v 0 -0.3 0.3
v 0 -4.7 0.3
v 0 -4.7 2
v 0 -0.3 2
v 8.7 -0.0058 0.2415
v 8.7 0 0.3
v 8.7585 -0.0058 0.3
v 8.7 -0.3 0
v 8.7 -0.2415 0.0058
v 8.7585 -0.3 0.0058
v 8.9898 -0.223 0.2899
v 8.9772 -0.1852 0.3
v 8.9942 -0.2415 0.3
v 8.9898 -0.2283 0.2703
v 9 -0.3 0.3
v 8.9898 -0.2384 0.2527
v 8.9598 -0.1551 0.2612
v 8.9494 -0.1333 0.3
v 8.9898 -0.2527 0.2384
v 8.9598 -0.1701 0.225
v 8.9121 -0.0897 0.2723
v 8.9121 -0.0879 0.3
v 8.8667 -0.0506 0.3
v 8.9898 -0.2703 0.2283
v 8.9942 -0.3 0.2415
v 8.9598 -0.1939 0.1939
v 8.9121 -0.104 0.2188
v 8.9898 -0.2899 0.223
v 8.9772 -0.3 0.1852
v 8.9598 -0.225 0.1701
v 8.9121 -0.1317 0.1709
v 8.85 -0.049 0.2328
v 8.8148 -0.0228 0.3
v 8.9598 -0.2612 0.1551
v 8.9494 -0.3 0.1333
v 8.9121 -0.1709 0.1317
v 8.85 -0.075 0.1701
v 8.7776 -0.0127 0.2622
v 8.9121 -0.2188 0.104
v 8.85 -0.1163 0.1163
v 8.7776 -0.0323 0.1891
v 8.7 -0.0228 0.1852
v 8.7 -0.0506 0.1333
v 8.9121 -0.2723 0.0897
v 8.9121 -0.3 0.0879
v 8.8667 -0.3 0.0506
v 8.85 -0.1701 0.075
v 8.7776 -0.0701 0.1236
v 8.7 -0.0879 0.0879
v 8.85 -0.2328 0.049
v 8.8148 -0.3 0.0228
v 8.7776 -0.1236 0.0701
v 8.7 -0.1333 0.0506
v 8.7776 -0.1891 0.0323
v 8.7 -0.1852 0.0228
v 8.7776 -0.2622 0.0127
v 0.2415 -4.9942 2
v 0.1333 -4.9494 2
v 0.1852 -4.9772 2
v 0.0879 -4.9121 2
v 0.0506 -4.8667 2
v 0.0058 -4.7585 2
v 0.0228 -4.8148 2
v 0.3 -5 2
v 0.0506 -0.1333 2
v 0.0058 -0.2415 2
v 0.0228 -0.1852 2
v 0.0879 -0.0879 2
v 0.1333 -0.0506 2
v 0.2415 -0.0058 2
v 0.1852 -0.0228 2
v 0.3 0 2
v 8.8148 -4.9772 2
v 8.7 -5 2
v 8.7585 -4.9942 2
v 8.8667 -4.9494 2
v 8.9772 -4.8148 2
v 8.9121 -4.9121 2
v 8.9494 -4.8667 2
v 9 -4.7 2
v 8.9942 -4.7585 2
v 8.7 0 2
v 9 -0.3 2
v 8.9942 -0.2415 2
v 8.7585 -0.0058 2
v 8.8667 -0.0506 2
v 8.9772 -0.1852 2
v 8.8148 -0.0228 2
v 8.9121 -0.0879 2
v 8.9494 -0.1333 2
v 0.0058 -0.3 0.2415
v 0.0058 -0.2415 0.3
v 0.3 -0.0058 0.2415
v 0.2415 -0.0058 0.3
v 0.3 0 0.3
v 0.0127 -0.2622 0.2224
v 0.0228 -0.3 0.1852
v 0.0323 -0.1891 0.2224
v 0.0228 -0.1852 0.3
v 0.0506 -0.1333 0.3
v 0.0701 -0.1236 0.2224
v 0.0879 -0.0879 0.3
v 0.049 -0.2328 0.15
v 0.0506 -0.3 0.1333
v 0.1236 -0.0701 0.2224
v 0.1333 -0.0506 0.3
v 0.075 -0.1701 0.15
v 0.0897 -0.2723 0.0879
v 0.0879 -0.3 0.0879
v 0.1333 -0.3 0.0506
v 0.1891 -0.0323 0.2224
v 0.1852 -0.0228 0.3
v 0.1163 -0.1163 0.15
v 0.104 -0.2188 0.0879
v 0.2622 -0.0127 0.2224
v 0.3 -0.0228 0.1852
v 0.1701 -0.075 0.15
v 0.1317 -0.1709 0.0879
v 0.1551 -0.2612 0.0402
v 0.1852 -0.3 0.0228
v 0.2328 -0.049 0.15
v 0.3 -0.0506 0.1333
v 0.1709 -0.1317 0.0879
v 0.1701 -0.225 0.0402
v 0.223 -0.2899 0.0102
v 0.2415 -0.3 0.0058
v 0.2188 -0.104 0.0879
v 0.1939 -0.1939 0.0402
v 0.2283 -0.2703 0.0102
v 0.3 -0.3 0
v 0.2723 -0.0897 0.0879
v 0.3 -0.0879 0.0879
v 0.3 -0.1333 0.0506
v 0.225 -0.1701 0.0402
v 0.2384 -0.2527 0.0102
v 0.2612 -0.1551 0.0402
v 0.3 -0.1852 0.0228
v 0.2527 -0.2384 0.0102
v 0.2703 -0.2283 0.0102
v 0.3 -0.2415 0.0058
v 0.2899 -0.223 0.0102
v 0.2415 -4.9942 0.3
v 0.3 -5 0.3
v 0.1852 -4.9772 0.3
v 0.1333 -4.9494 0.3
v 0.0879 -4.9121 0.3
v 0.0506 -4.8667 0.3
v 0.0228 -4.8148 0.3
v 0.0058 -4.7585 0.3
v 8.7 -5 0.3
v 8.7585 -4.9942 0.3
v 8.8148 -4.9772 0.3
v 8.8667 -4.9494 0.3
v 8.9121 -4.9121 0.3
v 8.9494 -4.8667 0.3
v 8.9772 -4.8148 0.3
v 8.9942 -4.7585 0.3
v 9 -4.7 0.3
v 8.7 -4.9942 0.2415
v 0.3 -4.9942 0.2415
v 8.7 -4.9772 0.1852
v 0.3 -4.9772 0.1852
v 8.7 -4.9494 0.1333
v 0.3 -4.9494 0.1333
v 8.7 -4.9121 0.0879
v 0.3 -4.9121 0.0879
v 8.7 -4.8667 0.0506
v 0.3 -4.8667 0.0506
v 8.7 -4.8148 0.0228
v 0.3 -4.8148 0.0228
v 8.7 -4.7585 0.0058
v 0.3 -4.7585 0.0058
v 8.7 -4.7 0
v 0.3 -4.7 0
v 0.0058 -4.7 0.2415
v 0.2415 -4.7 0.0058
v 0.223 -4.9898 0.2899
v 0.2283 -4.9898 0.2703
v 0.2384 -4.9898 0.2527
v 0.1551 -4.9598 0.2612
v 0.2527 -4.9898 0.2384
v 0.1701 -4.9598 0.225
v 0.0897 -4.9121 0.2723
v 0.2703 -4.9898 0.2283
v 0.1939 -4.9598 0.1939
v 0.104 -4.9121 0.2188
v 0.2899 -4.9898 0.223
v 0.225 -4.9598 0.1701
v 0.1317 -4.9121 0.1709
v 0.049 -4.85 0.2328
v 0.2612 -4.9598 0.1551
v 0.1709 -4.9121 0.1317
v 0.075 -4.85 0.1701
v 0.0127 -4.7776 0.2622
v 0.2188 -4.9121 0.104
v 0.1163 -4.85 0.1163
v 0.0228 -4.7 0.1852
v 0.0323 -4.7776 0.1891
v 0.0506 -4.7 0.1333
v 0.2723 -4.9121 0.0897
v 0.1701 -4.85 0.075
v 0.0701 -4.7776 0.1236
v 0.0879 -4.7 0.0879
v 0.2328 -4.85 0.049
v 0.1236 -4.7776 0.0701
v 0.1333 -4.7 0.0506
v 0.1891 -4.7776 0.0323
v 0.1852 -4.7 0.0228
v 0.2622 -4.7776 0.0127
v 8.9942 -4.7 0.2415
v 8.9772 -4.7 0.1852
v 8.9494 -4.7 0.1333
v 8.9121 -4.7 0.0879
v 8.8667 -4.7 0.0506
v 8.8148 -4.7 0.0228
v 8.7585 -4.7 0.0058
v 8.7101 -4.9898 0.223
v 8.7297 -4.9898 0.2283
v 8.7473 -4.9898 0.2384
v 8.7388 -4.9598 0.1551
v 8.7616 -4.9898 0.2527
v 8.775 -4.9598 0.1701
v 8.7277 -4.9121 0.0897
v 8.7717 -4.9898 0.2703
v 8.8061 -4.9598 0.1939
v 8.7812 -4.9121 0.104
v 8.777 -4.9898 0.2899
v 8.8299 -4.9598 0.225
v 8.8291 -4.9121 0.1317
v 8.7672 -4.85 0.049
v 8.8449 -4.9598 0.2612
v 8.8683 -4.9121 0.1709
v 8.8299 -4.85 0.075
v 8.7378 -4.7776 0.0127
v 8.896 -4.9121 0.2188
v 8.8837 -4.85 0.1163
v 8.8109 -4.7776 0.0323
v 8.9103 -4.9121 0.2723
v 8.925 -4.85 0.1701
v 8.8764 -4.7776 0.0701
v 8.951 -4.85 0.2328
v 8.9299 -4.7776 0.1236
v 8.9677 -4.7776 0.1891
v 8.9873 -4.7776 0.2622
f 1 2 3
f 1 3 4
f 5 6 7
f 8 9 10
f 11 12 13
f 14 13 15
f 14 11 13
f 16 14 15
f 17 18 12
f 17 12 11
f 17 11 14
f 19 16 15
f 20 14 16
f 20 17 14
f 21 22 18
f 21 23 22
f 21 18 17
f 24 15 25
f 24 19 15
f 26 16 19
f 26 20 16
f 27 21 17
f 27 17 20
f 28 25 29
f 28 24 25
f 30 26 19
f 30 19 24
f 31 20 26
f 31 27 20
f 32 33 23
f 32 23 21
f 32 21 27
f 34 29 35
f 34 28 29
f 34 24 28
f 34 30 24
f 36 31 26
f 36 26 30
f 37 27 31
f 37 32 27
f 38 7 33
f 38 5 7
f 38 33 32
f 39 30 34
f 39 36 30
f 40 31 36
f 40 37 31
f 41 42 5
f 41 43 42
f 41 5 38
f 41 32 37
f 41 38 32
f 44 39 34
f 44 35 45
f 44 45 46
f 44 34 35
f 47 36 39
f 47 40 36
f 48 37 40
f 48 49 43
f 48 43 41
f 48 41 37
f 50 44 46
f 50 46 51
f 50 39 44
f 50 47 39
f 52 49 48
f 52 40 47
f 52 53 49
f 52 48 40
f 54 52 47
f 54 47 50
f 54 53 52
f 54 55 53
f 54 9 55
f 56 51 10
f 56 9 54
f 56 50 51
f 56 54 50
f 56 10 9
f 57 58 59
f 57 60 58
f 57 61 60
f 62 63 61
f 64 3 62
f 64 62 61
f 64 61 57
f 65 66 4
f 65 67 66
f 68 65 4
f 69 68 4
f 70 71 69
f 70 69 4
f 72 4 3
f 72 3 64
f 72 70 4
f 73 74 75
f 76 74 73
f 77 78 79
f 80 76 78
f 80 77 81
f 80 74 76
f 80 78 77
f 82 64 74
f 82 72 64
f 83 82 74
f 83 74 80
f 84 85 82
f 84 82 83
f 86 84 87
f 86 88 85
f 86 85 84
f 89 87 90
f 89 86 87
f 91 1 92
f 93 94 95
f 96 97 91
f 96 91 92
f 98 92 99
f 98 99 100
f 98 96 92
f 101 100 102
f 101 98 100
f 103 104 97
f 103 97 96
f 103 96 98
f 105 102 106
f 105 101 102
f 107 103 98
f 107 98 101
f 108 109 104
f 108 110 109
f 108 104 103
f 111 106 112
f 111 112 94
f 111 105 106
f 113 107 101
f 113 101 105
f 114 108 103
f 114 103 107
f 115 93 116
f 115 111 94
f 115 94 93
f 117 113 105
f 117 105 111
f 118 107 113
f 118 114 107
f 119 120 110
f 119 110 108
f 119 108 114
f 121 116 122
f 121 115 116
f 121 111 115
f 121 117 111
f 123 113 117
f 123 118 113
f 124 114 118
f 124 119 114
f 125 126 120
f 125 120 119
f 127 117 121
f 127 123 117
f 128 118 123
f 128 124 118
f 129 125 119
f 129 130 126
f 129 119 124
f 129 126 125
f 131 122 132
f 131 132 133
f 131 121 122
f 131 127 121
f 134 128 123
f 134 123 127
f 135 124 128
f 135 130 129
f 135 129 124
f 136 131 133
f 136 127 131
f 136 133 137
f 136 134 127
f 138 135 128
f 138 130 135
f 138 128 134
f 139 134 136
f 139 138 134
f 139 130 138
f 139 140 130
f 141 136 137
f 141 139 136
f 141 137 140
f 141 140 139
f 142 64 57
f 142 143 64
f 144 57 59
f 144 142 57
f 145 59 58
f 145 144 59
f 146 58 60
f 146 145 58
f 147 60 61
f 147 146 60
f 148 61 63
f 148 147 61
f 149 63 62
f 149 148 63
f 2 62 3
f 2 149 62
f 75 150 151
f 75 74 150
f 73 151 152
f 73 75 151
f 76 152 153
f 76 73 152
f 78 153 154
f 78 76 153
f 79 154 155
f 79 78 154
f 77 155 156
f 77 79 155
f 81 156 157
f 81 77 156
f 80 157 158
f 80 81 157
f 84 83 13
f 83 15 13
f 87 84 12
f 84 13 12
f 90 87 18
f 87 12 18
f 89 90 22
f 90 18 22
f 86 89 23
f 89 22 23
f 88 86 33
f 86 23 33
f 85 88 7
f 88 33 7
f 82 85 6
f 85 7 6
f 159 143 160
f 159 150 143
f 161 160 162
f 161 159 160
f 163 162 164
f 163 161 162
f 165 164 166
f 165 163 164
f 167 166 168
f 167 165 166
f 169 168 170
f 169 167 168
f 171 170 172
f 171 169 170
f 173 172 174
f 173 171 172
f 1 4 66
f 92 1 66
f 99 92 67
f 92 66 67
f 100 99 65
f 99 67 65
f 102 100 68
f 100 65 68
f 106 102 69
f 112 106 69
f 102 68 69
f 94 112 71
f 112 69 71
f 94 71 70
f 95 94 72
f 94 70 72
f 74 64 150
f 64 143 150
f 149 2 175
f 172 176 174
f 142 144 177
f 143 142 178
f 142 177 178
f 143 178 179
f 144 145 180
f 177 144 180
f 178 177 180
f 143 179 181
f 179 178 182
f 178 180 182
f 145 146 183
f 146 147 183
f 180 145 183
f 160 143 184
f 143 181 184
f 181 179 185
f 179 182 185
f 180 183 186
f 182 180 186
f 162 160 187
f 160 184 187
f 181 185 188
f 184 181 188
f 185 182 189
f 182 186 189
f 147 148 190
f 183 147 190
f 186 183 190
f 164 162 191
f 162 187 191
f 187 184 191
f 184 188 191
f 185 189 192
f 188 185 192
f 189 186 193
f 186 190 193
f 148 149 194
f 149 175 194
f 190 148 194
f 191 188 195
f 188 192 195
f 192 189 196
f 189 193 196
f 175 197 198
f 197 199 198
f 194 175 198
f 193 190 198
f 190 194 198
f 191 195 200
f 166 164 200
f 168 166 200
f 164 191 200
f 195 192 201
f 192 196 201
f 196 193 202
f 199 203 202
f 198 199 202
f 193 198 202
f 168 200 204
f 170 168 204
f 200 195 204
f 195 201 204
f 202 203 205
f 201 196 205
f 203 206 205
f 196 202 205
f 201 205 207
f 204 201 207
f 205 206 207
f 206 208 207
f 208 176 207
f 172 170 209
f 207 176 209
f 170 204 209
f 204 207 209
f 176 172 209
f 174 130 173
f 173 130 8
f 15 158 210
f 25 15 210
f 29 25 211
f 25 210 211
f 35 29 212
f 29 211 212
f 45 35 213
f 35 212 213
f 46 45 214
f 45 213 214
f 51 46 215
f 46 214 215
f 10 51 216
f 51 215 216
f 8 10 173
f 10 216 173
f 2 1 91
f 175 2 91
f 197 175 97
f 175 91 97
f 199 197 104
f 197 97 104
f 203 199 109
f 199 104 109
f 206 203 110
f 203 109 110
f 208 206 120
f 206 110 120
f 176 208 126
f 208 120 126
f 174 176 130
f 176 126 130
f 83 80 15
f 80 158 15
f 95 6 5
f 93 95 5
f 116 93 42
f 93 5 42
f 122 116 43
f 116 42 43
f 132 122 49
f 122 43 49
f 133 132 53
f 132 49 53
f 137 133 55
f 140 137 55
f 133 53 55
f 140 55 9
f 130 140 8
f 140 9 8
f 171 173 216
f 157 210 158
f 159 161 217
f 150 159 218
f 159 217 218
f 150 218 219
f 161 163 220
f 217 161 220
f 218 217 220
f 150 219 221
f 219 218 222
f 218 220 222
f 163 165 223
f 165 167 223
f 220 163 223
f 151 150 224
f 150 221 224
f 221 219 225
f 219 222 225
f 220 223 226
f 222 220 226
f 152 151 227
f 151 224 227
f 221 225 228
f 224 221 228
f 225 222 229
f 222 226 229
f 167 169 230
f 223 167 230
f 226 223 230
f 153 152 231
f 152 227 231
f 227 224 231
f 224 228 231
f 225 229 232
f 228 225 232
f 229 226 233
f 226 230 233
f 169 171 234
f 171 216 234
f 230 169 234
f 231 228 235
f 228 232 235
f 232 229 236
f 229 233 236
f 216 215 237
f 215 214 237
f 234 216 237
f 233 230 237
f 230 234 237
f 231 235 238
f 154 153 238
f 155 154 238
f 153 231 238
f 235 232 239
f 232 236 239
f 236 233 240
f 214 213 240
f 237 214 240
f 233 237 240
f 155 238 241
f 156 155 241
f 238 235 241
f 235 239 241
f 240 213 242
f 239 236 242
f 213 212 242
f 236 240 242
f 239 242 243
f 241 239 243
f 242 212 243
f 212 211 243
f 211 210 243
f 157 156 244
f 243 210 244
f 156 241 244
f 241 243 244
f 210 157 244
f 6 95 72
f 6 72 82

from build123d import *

# Parameters (mm, degrees)
SKETCH1_W           = 9
SKETCH1_H           = 5
BOSS_EXTRUDE1_DEPTH = 2
FILLET7_R           = 0.3
FILLET8_R           = 0.3
FILLET9_R           = 0.3
FILLET10_R          = 0.3


with BuildPart() as part:
    # Sketch1 → Boss-Extrude1 (new body)
    with BuildSketch(Plane.XY):
        with Locations((4.5, -2.5)):
            Rectangle(SKETCH1_W, SKETCH1_H)
    extrude(amount=BOSS_EXTRUDE1_DEPTH)

    # Fillet7
    fillet7_edges = [part.edges().sort_by_distance(p)[0] for p in [
        (0, 0, 1),
    ]]
    fillet(fillet7_edges, radius=FILLET7_R)

    # Fillet8
    fillet8_edges = [part.edges().sort_by_distance(p)[0] for p in [
        (0, -2.65, 0),
        (0.087867966, -0.087867966, 0),
        (4.65, 0, 0),
    ]]
    fillet(fillet8_edges, radius=FILLET8_R)

    # Fillet9
    fillet9_edges = [part.edges().sort_by_distance(p)[0] for p in [
        (9, -0.087867966, 0.087867966),
        (9, -2.65, 0),
        (9, 0, 1.15),
    ]]
    fillet(fillet9_edges, radius=FILLET9_R)

    # Fillet10
    fillet10_edges = [part.edges().sort_by_distance(p)[0] for p in [
        (4.5, -5, 0),
        (0.087867966, -5, 0.087867966),
        (8.912132034, -5, 0.087867966),
        (9, -5, 1.15),
        (0, -5, 1.15),
    ]]
    fillet(fillet10_edges, radius=FILLET10_R)


solid = part.part
